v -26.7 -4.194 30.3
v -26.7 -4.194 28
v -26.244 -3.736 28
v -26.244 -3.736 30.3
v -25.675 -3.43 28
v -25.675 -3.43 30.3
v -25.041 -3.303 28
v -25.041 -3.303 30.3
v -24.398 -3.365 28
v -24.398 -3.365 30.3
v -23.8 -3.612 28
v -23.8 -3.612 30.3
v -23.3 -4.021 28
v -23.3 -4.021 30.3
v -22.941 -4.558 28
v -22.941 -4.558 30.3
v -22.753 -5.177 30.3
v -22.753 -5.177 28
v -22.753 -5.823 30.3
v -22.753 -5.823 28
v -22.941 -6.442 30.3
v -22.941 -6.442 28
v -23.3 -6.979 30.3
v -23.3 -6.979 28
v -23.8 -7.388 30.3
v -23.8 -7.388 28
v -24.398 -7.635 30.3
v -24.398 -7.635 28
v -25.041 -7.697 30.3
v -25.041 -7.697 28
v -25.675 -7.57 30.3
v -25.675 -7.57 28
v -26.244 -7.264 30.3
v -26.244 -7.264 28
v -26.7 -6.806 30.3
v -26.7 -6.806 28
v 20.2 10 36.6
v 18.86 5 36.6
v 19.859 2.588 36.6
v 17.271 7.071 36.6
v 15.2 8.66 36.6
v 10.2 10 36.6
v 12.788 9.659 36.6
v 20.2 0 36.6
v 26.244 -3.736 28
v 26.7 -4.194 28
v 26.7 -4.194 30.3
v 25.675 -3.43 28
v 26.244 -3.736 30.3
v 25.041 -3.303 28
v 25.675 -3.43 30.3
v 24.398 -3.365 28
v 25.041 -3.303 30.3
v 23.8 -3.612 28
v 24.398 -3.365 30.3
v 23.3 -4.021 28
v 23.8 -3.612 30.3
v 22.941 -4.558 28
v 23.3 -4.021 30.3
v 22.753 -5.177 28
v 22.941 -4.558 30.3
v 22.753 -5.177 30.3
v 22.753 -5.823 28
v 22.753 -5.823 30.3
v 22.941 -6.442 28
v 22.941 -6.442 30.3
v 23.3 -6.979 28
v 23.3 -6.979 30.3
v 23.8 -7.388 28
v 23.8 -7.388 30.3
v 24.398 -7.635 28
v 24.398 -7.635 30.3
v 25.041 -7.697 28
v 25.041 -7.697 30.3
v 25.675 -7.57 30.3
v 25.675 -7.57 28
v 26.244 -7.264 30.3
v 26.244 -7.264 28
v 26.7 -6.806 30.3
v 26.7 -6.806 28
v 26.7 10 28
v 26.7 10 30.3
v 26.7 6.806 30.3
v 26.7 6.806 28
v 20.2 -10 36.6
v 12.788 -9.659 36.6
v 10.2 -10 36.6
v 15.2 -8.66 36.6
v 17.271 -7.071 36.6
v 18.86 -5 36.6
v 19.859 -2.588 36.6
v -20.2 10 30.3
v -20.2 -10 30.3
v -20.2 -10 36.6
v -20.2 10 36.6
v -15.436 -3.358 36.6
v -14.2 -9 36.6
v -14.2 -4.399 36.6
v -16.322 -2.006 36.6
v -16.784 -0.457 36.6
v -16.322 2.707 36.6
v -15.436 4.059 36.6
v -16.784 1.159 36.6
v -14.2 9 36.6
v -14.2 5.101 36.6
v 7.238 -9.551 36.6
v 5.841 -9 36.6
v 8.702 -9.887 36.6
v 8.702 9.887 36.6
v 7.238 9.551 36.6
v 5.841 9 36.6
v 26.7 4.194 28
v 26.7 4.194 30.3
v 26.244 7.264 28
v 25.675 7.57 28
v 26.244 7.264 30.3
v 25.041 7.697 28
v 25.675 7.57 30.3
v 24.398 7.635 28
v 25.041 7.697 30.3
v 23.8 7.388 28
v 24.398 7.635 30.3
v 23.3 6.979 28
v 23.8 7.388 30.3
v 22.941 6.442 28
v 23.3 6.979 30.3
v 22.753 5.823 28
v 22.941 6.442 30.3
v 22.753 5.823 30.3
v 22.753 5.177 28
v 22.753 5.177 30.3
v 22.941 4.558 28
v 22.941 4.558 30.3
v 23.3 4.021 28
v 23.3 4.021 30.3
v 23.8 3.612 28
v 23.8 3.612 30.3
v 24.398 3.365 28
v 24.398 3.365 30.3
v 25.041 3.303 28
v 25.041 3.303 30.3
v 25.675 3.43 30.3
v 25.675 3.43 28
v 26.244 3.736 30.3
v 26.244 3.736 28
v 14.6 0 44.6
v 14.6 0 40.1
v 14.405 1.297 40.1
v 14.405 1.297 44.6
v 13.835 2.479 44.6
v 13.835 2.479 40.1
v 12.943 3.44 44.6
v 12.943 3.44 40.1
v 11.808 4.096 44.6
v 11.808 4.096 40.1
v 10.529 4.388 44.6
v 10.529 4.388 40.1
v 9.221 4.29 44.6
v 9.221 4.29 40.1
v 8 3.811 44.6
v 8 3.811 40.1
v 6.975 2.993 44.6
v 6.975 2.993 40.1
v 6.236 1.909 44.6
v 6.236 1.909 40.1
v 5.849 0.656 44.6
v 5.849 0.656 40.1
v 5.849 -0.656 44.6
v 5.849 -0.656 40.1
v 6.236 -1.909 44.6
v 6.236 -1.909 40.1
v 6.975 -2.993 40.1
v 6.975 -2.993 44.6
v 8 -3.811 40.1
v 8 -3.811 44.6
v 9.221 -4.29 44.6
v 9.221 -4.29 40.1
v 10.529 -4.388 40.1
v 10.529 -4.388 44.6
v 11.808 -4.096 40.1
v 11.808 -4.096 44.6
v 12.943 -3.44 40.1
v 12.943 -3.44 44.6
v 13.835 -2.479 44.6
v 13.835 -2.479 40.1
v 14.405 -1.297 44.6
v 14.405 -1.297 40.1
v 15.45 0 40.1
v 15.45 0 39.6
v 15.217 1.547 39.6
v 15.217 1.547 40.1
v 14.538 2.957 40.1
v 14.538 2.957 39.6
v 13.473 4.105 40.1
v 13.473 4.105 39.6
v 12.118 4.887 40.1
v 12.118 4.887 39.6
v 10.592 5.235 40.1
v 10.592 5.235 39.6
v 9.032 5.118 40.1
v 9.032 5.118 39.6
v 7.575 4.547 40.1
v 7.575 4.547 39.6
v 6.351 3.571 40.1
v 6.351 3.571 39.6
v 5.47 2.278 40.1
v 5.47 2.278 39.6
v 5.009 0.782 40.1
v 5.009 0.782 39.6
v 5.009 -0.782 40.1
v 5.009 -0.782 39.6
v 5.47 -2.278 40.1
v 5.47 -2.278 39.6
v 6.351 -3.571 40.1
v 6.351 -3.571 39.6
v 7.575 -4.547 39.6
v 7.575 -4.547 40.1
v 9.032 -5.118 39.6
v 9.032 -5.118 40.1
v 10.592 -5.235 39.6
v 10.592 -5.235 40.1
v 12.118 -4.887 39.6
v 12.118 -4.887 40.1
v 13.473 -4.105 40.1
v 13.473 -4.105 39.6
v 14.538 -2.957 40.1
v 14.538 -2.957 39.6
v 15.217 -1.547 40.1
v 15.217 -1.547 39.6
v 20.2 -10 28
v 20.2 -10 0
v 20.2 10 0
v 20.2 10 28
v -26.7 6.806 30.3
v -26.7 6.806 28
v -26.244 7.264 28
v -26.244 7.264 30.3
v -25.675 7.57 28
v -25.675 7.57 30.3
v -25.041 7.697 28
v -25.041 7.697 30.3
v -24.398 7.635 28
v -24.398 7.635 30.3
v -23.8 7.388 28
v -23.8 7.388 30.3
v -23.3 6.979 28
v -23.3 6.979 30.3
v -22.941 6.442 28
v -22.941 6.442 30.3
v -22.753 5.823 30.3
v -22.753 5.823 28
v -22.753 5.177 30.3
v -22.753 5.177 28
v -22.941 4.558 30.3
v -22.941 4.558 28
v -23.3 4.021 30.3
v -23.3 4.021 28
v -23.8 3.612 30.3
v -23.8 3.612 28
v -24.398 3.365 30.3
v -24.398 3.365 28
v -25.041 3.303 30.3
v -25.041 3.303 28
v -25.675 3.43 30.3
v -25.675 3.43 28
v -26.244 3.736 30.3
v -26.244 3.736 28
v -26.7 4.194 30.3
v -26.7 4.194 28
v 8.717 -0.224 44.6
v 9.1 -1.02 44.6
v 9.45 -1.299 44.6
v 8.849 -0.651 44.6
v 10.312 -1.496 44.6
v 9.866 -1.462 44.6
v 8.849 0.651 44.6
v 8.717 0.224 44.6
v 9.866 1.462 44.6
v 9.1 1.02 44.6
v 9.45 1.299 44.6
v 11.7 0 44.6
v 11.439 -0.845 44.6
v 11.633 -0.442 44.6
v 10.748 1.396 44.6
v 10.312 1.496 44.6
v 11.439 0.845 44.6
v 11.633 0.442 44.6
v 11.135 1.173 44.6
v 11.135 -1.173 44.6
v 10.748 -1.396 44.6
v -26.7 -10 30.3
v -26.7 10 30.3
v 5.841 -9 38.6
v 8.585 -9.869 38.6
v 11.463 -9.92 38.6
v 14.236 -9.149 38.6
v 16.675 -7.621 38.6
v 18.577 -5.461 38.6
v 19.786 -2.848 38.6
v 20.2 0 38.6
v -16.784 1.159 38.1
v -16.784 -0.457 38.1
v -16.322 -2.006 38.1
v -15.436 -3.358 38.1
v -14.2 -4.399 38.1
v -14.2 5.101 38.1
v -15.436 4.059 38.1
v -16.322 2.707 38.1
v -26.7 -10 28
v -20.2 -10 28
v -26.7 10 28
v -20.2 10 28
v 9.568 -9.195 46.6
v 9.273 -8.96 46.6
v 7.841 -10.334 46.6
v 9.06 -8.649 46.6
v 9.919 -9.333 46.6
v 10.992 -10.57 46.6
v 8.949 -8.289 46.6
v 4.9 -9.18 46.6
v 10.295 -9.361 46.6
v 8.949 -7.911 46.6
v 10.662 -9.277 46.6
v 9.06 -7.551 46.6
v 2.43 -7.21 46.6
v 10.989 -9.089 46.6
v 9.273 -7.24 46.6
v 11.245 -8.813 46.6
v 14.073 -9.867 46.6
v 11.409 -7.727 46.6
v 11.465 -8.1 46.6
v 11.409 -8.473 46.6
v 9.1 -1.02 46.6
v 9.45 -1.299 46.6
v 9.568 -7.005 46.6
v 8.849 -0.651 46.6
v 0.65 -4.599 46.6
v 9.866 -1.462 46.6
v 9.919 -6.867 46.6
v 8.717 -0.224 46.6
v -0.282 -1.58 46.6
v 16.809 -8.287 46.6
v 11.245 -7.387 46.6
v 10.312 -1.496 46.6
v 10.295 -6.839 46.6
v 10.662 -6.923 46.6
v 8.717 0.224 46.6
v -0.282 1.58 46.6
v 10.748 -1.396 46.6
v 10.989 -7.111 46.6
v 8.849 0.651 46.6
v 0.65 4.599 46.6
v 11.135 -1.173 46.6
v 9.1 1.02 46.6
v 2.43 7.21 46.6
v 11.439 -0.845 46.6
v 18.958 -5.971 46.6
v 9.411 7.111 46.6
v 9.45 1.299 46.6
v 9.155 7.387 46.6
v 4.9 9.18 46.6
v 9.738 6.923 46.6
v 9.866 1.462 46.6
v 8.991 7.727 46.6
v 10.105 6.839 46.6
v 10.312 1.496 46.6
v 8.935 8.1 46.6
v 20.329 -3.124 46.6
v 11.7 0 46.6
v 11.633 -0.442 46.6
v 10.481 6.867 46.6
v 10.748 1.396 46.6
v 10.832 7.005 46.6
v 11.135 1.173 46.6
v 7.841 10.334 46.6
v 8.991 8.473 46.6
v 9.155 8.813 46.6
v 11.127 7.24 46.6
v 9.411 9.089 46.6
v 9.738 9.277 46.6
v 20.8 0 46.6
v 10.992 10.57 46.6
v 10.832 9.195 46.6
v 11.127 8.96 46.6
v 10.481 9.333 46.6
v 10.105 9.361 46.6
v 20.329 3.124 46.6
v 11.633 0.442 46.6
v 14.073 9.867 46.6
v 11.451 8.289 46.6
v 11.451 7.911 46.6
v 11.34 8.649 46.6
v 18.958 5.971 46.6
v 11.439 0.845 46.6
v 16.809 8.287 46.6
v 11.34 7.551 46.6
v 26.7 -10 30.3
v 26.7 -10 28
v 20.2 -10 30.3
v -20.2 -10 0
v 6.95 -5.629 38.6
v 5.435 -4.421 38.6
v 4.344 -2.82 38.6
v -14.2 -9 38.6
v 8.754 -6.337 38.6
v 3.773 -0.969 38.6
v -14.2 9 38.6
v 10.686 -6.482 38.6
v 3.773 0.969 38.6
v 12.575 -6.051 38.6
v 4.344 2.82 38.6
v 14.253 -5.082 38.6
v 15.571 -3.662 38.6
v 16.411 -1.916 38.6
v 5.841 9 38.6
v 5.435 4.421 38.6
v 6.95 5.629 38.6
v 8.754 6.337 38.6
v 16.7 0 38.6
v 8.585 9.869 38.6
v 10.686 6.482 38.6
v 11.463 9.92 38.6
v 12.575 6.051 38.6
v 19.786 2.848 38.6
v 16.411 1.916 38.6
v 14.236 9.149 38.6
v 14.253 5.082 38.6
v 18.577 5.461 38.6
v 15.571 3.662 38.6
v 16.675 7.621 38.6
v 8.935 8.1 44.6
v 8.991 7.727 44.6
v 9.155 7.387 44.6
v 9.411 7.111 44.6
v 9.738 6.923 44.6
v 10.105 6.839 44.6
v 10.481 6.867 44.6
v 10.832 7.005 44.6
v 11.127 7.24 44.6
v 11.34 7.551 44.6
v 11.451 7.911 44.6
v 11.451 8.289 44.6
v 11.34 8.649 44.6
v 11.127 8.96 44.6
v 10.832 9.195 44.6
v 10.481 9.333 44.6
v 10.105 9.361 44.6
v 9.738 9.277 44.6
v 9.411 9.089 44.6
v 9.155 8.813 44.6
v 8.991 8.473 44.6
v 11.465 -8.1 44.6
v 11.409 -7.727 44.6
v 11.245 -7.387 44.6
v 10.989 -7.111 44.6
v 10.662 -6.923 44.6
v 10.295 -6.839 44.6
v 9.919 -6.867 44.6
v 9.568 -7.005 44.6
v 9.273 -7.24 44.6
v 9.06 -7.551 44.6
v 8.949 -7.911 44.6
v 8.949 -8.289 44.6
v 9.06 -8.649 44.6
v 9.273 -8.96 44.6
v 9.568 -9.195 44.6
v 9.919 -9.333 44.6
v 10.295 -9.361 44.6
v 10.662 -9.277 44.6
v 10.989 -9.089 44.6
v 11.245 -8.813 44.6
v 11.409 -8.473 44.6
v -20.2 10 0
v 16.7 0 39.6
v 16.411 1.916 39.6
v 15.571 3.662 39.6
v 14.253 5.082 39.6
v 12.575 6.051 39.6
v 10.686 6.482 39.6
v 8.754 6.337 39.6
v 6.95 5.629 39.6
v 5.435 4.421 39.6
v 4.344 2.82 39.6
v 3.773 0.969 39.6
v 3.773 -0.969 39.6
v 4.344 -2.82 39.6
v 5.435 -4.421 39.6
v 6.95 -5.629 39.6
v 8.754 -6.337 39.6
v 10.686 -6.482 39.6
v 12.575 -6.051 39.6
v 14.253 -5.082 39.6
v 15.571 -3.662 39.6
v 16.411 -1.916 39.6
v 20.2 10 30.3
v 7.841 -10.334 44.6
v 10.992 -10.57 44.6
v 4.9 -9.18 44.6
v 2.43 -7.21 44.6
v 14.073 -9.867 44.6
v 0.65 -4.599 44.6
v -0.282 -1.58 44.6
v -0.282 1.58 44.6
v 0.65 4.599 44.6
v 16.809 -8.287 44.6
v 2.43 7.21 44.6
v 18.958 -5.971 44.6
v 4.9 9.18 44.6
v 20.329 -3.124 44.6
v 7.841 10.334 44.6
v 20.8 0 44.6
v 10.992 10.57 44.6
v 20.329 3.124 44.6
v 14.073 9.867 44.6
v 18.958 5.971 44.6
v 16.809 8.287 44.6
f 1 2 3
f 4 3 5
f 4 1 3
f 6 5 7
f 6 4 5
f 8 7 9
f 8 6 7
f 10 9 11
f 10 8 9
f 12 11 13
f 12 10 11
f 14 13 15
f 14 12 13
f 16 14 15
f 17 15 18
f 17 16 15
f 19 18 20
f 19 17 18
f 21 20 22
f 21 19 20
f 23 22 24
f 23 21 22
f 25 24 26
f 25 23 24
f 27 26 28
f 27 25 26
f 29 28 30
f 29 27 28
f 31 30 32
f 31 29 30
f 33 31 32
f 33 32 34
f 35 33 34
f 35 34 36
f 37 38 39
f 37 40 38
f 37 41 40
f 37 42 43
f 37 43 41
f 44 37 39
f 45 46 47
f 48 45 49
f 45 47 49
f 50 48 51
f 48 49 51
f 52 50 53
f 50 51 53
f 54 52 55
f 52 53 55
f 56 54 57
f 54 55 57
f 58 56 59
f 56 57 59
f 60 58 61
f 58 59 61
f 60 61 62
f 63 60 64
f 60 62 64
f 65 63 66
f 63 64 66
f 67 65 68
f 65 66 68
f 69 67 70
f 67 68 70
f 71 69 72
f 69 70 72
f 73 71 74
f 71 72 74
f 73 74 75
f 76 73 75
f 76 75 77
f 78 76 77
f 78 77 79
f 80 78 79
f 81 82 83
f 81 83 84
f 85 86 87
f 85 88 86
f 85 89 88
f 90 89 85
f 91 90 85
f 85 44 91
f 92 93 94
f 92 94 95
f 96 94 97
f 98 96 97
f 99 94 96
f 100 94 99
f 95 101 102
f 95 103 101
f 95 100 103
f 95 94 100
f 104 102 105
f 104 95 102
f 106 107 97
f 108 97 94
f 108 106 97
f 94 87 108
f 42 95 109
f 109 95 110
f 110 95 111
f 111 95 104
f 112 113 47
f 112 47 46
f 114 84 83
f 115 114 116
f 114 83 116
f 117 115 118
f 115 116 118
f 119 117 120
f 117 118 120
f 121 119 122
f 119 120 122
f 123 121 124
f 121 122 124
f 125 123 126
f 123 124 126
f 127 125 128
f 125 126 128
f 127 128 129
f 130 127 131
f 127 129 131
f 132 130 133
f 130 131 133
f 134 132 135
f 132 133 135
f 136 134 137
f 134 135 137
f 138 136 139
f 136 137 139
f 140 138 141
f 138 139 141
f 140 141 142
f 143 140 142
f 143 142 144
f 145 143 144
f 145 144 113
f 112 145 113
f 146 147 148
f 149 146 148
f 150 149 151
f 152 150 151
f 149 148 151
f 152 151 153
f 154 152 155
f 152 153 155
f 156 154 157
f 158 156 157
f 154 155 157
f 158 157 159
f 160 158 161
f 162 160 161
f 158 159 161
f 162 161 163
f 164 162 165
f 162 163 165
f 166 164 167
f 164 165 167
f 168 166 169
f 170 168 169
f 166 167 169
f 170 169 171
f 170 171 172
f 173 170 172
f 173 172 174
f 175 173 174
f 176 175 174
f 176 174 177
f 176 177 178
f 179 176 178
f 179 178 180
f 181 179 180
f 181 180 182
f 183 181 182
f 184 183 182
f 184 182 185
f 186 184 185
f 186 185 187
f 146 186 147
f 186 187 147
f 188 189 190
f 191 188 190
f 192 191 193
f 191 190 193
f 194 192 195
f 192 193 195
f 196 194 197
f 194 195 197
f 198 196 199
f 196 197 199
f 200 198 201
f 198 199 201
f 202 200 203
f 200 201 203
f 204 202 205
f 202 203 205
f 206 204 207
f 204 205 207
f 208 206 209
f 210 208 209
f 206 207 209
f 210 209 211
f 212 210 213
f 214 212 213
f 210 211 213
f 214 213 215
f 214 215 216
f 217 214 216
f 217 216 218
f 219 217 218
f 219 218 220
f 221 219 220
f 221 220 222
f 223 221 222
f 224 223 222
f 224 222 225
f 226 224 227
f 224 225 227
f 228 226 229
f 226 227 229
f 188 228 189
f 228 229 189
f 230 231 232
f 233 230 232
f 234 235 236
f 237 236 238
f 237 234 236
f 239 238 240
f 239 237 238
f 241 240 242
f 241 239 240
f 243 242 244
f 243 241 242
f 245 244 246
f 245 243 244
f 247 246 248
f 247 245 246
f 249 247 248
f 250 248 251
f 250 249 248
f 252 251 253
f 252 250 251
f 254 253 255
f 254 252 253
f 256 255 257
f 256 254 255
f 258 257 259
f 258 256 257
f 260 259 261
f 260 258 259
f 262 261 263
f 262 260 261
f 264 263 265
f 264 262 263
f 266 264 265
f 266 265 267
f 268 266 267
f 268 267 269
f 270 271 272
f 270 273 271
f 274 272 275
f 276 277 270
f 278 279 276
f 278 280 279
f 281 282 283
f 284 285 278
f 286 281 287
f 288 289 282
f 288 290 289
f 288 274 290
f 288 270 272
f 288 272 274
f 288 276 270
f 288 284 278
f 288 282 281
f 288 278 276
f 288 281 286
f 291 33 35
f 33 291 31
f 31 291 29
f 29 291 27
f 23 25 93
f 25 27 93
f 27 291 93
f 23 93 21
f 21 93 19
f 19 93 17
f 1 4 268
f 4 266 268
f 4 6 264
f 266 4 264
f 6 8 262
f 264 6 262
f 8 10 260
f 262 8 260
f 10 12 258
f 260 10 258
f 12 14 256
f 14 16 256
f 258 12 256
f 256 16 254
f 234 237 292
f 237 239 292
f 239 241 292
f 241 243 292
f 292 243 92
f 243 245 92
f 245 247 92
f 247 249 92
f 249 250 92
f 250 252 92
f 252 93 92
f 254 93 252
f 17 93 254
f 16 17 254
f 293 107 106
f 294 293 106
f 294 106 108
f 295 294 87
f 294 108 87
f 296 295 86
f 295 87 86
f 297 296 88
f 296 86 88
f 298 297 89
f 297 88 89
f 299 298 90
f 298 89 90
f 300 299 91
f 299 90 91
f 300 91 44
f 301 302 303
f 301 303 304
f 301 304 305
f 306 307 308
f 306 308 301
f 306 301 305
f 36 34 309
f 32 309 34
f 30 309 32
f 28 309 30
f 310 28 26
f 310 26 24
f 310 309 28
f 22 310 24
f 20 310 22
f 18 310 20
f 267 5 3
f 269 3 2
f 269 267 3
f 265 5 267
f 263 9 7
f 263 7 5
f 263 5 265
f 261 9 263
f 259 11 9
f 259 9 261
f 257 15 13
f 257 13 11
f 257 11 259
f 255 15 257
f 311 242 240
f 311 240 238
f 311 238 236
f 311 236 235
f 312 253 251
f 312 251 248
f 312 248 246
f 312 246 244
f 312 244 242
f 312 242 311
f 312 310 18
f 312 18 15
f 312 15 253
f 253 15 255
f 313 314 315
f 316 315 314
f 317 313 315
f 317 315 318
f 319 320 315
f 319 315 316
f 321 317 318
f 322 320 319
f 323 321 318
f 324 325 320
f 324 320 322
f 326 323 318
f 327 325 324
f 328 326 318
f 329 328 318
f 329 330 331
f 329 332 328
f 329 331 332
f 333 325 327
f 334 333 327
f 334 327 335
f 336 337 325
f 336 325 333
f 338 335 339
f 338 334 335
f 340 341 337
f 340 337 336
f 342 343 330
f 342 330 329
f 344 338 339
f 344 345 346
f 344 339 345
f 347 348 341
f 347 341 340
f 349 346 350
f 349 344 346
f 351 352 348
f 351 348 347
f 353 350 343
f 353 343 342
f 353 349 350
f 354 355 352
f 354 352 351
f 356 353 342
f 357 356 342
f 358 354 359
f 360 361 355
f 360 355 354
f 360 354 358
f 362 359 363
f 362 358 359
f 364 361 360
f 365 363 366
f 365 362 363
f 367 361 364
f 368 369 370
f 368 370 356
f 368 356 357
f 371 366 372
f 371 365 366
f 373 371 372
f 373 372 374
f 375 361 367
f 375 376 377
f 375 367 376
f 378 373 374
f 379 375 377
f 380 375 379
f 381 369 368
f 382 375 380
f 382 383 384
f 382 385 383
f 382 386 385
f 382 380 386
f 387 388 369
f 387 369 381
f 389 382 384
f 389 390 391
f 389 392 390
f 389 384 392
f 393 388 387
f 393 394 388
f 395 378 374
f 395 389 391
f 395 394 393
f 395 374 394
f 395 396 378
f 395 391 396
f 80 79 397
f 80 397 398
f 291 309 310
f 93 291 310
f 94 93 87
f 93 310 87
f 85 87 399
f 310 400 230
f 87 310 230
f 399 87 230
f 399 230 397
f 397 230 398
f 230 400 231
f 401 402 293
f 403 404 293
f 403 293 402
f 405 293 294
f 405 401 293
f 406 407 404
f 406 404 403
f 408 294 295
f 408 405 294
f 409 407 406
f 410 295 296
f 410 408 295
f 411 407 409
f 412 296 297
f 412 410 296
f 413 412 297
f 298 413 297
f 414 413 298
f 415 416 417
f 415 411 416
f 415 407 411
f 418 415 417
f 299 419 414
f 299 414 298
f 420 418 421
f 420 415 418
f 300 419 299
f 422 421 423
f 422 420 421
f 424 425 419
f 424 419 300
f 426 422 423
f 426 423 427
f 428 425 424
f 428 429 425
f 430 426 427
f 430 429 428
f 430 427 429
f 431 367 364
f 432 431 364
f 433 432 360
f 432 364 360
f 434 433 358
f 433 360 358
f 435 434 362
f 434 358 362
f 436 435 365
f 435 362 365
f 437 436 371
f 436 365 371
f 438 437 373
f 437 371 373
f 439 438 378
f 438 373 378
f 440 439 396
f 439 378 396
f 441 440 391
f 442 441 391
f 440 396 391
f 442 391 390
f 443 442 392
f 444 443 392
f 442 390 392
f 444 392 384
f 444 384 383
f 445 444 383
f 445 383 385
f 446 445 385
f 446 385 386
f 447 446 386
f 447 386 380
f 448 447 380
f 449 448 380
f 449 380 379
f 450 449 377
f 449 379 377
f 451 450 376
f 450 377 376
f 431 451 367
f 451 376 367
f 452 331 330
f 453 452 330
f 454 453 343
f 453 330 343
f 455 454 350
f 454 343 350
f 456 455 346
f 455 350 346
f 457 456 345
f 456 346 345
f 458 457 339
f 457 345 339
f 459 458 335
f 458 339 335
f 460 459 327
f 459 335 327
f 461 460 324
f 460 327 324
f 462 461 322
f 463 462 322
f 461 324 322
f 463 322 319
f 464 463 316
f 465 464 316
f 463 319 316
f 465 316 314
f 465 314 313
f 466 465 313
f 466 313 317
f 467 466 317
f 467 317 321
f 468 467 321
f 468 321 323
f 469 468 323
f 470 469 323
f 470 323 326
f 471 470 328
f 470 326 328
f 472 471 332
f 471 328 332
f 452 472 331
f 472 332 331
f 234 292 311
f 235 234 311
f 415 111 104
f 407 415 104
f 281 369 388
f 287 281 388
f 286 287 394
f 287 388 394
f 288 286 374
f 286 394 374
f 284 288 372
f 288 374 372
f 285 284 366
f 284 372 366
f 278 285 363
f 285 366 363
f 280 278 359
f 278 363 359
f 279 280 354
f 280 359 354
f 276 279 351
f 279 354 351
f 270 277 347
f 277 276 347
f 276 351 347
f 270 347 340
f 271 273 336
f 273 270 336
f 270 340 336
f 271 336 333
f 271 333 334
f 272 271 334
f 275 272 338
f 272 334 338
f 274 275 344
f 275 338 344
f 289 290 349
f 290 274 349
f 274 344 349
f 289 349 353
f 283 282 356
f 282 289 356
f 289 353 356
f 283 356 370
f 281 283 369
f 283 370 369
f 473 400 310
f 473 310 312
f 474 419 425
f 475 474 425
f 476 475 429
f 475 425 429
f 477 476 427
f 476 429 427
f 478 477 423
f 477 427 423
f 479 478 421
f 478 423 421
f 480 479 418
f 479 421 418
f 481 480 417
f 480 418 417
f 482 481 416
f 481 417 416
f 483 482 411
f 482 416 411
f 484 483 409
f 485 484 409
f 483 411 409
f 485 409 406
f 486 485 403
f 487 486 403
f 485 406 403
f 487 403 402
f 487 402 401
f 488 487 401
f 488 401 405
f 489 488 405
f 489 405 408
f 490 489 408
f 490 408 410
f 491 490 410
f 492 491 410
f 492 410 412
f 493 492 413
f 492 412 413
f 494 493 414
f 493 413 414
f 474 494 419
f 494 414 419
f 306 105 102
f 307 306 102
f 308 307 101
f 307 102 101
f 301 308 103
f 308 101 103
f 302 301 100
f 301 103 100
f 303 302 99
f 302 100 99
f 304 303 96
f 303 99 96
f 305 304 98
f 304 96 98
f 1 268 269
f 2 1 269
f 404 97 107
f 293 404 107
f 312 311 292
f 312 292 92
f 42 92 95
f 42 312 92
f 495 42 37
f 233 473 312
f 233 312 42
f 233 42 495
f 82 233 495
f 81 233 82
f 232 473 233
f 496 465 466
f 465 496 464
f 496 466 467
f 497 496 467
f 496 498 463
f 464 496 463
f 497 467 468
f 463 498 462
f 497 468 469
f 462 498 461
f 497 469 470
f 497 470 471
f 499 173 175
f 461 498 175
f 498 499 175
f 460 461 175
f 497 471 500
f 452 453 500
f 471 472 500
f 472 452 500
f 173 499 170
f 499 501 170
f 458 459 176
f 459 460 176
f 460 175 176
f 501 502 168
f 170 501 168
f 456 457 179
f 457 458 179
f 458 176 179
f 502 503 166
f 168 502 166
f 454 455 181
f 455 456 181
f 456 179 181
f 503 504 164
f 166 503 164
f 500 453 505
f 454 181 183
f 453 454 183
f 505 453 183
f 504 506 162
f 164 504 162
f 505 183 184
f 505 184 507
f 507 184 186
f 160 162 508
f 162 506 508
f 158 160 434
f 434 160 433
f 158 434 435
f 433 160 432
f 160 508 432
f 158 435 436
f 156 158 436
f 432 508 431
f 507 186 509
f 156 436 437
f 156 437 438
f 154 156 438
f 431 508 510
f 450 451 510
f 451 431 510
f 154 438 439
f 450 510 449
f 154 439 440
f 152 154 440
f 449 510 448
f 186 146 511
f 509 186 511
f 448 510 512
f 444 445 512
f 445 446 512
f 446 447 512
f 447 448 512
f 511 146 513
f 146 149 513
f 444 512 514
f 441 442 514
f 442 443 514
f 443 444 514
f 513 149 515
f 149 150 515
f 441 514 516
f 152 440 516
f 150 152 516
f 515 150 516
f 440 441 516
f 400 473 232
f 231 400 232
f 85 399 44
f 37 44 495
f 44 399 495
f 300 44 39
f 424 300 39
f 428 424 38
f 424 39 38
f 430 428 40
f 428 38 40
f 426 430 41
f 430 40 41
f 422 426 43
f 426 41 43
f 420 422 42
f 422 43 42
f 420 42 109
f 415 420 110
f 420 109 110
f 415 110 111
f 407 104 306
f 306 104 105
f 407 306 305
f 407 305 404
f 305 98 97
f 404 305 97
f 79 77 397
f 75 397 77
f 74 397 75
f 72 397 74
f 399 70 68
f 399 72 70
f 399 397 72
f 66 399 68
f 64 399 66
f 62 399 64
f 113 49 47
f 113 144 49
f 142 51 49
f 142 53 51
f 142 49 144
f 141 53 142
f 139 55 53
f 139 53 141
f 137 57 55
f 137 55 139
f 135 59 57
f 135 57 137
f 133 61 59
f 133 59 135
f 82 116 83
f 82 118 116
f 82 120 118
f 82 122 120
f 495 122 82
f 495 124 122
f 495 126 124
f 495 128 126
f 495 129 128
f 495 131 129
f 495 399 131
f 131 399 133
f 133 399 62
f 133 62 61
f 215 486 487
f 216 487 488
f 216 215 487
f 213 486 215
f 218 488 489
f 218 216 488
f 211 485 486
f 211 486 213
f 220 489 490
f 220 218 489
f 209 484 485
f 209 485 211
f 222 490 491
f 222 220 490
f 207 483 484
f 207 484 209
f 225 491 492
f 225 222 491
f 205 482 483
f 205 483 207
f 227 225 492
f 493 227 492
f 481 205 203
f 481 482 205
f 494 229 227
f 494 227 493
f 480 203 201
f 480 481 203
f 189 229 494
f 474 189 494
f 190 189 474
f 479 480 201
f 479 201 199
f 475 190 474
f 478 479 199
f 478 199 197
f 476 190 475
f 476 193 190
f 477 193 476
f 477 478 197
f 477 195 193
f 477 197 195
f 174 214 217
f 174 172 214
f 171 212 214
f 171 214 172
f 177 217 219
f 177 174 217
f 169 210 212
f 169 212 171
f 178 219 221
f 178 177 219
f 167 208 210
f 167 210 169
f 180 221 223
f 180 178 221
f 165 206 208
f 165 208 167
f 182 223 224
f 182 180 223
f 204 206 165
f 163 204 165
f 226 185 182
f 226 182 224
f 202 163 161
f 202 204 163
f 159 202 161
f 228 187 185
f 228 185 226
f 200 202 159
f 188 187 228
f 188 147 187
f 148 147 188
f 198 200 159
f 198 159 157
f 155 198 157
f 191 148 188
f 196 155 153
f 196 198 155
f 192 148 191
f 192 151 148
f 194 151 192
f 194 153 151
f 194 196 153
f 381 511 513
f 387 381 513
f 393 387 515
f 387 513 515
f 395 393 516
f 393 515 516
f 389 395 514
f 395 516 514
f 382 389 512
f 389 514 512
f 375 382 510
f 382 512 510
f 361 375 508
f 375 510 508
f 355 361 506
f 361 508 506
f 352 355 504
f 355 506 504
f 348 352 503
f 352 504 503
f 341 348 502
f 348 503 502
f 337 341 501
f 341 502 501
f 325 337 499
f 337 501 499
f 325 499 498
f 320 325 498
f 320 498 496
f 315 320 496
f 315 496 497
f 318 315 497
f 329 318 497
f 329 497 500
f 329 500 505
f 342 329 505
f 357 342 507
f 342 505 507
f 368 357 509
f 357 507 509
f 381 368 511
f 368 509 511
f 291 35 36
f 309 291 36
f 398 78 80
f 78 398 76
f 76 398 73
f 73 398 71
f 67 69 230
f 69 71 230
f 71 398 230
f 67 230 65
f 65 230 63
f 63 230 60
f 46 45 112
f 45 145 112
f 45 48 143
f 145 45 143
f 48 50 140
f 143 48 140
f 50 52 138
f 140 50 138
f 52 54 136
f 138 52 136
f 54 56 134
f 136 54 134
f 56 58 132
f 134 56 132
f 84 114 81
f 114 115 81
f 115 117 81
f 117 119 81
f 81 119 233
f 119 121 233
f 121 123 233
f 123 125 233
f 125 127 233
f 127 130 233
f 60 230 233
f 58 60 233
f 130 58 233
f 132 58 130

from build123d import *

# Parameters (mm, degrees)
SKETCH1_W           = 40.4
SKETCH1_H           = 20
BOSS_EXTRUDE1_DEPTH = 36.6
SKETCH2_W           = 2.3
SKETCH2_H           = 20
BOSS_EXTRUDE2_DEPTH = 6.5
SKETCH3_R           = 2.2
CUT_EXTRUDE1_DEPTH  = 6.5
BOSS_EXTRUDE4_DEPTH = 2
BOSS_EXTRUDE5_DEPTH = 1.5
SKETCH7_R           = 6.5
BOSS_EXTRUDE6_DEPTH = 1
SKETCH9_R           = 5.25
BOSS_EXTRUDE7_DEPTH = 0.5
SKETCH10_R          = 4.4
BOSS_EXTRUDE8_DEPTH = 4.5
SKETCH11_R          = 10.6
BOSS_EXTRUDE9_DEPTH = 2
SKETCH12_R          = 1.5
SKETCH12_R_2        = 1.264823641
CUT_EXTRUDE2_DEPTH  = 2
CIRPATTERN1_COUNT   = 2


with BuildPart() as part:
    # Sketch1 → Boss-Extrude1 (new body)
    with BuildSketch(Plane.XY):
        Rectangle(SKETCH1_W, SKETCH1_H)
    extrude(amount=BOSS_EXTRUDE1_DEPTH)

    # Sketch2 → Boss-Extrude2 (add)
    with BuildSketch(Plane(origin=(20.2, 0, 0), x_dir=(0, 0, -1), z_dir=(1, 0, 0))):
        with Locations((-29.15, 0)):
            Rectangle(SKETCH2_W, SKETCH2_H)
    boss_extrude2 = extrude(amount=BOSS_EXTRUDE2_DEPTH)

    # Sketch3 → Cut-Extrude1 (cut)
    with BuildSketch(Plane.XY.offset(30.3)):
        with Locations((24.929249083, -5.5)):
            Circle(SKETCH3_R)
        with Locations((24.929249083, 5.5)):
            Circle(SKETCH3_R)
    cut_extrude1 = extrude(amount=-CUT_EXTRUDE1_DEPTH, mode=Mode.SUBTRACT)

    # Mirror1: Boss-Extrude2, Cut-Extrude1 across plane
    add(boss_extrude2.mirror(Plane(origin=(0, 0, 0), x_dir=(0, 0, 1), z_dir=(1, 0, 0))))
    add(cut_extrude1.mirror(Plane(origin=(0, 0, 0), x_dir=(0, 0, 1), z_dir=(1, 0, 0))), mode=Mode.SUBTRACT)

    # Sketch5 → Boss-Extrude4 (add)
    with BuildSketch(Plane.XY.offset(36.6)):
        with BuildLine():
            Line((5.841101056, 9), (-14.2, 9))
            Line((-14.2, 9), (-14.2, 5.100716034))
            Line((-14.2, 5.100716034), (-14.2, -4.399283966))
            Line((-14.2, -4.399283966), (-14.2, -9))
            Line((-14.2, -9), (5.841101056, -9))
            ThreePointArc((5.841101056, -9), (0.2, 0), (5.841101056, 9))
        make_face()
        with BuildLine():
            ThreePointArc((20.2, 0), (15.510885546, 8.473163206), (5.841101056, 9))
            Line((5.841101056, 9), (5.841101056, -9))
            ThreePointArc((5.841101056, -9), (15.510885546, -8.473163206), (20.2, 0))
        make_face()
        with BuildLine():
            Line((5.841101056, -9), (5.841101056, 9))
            ThreePointArc((5.841101056, 9), (0.2, 0), (5.841101056, -9))
        make_face()
        with BuildLine():
            ThreePointArc((20.2, 0), (15.510885546, 8.473163206), (5.841101056, 9))
            Line((5.841101056, 9), (5.841101056, -9))
            ThreePointArc((5.841101056, -9), (15.510885546, -8.473163206), (20.2, 0))
        make_face()
        with BuildLine():
            Line((5.841101056, -9), (5.841101056, 9))
            ThreePointArc((5.841101056, 9), (0.2, 0), (5.841101056, -9))
        make_face()
    extrude(amount=BOSS_EXTRUDE4_DEPTH)

    # Sketch6 → Boss-Extrude5 (add)
    with BuildSketch(Plane.XY.offset(36.6)):
        with BuildLine():
            Line((-14.2, -4.399283966), (-14.2, 5.100716034))
            ThreePointArc((-14.2, 5.100716034), (-16.842653315, 0.350716034), (-14.2, -4.399283966))
        make_face()
    extrude(amount=BOSS_EXTRUDE5_DEPTH)

    # Sketch7 → Boss-Extrude6 (add)
    with BuildSketch(Plane.XY.offset(38.6)):
        with Locations((10.2, 0)):
            Circle(SKETCH7_R)
    extrude(amount=BOSS_EXTRUDE6_DEPTH)

    # Sketch9 → Boss-Extrude7 (add)
    with BuildSketch(Plane.XY.offset(39.6)):
        with Locations((10.2, 0)):
            Circle(SKETCH9_R)
    extrude(amount=BOSS_EXTRUDE7_DEPTH)

    # Sketch10 → Boss-Extrude8 (add)
    with BuildSketch(Plane.XY.offset(40.1)):
        with Locations((10.2, 0)):
            Circle(SKETCH10_R)
    extrude(amount=BOSS_EXTRUDE8_DEPTH)

    # Sketch11 → Boss-Extrude9 (add)
    with BuildSketch(Plane.XY.offset(44.6)):
        with Locations((10.2, 0)):
            Circle(SKETCH11_R)
    extrude(amount=BOSS_EXTRUDE9_DEPTH)

    # Sketch12 → Cut-Extrude2 (cut)
    with BuildSketch(Plane.XY.offset(46.6)):
        with Locations((10.2, 0)):
            Circle(SKETCH12_R)
        with Locations((10.2, -8.1)):
            Circle(SKETCH12_R_2)
    cut_extrude2 = extrude(amount=-CUT_EXTRUDE2_DEPTH, mode=Mode.SUBTRACT)

    # CirPattern1: Cut-Extrude2 ×2 about axis
    cirpattern1_axis = Axis((10.2, 0, 0), (0, 0, 1))
    for i in range(1, CIRPATTERN1_COUNT):
        add(cut_extrude2.rotate(cirpattern1_axis, i * 360 / CIRPATTERN1_COUNT), mode=Mode.SUBTRACT)


solid = part.part
